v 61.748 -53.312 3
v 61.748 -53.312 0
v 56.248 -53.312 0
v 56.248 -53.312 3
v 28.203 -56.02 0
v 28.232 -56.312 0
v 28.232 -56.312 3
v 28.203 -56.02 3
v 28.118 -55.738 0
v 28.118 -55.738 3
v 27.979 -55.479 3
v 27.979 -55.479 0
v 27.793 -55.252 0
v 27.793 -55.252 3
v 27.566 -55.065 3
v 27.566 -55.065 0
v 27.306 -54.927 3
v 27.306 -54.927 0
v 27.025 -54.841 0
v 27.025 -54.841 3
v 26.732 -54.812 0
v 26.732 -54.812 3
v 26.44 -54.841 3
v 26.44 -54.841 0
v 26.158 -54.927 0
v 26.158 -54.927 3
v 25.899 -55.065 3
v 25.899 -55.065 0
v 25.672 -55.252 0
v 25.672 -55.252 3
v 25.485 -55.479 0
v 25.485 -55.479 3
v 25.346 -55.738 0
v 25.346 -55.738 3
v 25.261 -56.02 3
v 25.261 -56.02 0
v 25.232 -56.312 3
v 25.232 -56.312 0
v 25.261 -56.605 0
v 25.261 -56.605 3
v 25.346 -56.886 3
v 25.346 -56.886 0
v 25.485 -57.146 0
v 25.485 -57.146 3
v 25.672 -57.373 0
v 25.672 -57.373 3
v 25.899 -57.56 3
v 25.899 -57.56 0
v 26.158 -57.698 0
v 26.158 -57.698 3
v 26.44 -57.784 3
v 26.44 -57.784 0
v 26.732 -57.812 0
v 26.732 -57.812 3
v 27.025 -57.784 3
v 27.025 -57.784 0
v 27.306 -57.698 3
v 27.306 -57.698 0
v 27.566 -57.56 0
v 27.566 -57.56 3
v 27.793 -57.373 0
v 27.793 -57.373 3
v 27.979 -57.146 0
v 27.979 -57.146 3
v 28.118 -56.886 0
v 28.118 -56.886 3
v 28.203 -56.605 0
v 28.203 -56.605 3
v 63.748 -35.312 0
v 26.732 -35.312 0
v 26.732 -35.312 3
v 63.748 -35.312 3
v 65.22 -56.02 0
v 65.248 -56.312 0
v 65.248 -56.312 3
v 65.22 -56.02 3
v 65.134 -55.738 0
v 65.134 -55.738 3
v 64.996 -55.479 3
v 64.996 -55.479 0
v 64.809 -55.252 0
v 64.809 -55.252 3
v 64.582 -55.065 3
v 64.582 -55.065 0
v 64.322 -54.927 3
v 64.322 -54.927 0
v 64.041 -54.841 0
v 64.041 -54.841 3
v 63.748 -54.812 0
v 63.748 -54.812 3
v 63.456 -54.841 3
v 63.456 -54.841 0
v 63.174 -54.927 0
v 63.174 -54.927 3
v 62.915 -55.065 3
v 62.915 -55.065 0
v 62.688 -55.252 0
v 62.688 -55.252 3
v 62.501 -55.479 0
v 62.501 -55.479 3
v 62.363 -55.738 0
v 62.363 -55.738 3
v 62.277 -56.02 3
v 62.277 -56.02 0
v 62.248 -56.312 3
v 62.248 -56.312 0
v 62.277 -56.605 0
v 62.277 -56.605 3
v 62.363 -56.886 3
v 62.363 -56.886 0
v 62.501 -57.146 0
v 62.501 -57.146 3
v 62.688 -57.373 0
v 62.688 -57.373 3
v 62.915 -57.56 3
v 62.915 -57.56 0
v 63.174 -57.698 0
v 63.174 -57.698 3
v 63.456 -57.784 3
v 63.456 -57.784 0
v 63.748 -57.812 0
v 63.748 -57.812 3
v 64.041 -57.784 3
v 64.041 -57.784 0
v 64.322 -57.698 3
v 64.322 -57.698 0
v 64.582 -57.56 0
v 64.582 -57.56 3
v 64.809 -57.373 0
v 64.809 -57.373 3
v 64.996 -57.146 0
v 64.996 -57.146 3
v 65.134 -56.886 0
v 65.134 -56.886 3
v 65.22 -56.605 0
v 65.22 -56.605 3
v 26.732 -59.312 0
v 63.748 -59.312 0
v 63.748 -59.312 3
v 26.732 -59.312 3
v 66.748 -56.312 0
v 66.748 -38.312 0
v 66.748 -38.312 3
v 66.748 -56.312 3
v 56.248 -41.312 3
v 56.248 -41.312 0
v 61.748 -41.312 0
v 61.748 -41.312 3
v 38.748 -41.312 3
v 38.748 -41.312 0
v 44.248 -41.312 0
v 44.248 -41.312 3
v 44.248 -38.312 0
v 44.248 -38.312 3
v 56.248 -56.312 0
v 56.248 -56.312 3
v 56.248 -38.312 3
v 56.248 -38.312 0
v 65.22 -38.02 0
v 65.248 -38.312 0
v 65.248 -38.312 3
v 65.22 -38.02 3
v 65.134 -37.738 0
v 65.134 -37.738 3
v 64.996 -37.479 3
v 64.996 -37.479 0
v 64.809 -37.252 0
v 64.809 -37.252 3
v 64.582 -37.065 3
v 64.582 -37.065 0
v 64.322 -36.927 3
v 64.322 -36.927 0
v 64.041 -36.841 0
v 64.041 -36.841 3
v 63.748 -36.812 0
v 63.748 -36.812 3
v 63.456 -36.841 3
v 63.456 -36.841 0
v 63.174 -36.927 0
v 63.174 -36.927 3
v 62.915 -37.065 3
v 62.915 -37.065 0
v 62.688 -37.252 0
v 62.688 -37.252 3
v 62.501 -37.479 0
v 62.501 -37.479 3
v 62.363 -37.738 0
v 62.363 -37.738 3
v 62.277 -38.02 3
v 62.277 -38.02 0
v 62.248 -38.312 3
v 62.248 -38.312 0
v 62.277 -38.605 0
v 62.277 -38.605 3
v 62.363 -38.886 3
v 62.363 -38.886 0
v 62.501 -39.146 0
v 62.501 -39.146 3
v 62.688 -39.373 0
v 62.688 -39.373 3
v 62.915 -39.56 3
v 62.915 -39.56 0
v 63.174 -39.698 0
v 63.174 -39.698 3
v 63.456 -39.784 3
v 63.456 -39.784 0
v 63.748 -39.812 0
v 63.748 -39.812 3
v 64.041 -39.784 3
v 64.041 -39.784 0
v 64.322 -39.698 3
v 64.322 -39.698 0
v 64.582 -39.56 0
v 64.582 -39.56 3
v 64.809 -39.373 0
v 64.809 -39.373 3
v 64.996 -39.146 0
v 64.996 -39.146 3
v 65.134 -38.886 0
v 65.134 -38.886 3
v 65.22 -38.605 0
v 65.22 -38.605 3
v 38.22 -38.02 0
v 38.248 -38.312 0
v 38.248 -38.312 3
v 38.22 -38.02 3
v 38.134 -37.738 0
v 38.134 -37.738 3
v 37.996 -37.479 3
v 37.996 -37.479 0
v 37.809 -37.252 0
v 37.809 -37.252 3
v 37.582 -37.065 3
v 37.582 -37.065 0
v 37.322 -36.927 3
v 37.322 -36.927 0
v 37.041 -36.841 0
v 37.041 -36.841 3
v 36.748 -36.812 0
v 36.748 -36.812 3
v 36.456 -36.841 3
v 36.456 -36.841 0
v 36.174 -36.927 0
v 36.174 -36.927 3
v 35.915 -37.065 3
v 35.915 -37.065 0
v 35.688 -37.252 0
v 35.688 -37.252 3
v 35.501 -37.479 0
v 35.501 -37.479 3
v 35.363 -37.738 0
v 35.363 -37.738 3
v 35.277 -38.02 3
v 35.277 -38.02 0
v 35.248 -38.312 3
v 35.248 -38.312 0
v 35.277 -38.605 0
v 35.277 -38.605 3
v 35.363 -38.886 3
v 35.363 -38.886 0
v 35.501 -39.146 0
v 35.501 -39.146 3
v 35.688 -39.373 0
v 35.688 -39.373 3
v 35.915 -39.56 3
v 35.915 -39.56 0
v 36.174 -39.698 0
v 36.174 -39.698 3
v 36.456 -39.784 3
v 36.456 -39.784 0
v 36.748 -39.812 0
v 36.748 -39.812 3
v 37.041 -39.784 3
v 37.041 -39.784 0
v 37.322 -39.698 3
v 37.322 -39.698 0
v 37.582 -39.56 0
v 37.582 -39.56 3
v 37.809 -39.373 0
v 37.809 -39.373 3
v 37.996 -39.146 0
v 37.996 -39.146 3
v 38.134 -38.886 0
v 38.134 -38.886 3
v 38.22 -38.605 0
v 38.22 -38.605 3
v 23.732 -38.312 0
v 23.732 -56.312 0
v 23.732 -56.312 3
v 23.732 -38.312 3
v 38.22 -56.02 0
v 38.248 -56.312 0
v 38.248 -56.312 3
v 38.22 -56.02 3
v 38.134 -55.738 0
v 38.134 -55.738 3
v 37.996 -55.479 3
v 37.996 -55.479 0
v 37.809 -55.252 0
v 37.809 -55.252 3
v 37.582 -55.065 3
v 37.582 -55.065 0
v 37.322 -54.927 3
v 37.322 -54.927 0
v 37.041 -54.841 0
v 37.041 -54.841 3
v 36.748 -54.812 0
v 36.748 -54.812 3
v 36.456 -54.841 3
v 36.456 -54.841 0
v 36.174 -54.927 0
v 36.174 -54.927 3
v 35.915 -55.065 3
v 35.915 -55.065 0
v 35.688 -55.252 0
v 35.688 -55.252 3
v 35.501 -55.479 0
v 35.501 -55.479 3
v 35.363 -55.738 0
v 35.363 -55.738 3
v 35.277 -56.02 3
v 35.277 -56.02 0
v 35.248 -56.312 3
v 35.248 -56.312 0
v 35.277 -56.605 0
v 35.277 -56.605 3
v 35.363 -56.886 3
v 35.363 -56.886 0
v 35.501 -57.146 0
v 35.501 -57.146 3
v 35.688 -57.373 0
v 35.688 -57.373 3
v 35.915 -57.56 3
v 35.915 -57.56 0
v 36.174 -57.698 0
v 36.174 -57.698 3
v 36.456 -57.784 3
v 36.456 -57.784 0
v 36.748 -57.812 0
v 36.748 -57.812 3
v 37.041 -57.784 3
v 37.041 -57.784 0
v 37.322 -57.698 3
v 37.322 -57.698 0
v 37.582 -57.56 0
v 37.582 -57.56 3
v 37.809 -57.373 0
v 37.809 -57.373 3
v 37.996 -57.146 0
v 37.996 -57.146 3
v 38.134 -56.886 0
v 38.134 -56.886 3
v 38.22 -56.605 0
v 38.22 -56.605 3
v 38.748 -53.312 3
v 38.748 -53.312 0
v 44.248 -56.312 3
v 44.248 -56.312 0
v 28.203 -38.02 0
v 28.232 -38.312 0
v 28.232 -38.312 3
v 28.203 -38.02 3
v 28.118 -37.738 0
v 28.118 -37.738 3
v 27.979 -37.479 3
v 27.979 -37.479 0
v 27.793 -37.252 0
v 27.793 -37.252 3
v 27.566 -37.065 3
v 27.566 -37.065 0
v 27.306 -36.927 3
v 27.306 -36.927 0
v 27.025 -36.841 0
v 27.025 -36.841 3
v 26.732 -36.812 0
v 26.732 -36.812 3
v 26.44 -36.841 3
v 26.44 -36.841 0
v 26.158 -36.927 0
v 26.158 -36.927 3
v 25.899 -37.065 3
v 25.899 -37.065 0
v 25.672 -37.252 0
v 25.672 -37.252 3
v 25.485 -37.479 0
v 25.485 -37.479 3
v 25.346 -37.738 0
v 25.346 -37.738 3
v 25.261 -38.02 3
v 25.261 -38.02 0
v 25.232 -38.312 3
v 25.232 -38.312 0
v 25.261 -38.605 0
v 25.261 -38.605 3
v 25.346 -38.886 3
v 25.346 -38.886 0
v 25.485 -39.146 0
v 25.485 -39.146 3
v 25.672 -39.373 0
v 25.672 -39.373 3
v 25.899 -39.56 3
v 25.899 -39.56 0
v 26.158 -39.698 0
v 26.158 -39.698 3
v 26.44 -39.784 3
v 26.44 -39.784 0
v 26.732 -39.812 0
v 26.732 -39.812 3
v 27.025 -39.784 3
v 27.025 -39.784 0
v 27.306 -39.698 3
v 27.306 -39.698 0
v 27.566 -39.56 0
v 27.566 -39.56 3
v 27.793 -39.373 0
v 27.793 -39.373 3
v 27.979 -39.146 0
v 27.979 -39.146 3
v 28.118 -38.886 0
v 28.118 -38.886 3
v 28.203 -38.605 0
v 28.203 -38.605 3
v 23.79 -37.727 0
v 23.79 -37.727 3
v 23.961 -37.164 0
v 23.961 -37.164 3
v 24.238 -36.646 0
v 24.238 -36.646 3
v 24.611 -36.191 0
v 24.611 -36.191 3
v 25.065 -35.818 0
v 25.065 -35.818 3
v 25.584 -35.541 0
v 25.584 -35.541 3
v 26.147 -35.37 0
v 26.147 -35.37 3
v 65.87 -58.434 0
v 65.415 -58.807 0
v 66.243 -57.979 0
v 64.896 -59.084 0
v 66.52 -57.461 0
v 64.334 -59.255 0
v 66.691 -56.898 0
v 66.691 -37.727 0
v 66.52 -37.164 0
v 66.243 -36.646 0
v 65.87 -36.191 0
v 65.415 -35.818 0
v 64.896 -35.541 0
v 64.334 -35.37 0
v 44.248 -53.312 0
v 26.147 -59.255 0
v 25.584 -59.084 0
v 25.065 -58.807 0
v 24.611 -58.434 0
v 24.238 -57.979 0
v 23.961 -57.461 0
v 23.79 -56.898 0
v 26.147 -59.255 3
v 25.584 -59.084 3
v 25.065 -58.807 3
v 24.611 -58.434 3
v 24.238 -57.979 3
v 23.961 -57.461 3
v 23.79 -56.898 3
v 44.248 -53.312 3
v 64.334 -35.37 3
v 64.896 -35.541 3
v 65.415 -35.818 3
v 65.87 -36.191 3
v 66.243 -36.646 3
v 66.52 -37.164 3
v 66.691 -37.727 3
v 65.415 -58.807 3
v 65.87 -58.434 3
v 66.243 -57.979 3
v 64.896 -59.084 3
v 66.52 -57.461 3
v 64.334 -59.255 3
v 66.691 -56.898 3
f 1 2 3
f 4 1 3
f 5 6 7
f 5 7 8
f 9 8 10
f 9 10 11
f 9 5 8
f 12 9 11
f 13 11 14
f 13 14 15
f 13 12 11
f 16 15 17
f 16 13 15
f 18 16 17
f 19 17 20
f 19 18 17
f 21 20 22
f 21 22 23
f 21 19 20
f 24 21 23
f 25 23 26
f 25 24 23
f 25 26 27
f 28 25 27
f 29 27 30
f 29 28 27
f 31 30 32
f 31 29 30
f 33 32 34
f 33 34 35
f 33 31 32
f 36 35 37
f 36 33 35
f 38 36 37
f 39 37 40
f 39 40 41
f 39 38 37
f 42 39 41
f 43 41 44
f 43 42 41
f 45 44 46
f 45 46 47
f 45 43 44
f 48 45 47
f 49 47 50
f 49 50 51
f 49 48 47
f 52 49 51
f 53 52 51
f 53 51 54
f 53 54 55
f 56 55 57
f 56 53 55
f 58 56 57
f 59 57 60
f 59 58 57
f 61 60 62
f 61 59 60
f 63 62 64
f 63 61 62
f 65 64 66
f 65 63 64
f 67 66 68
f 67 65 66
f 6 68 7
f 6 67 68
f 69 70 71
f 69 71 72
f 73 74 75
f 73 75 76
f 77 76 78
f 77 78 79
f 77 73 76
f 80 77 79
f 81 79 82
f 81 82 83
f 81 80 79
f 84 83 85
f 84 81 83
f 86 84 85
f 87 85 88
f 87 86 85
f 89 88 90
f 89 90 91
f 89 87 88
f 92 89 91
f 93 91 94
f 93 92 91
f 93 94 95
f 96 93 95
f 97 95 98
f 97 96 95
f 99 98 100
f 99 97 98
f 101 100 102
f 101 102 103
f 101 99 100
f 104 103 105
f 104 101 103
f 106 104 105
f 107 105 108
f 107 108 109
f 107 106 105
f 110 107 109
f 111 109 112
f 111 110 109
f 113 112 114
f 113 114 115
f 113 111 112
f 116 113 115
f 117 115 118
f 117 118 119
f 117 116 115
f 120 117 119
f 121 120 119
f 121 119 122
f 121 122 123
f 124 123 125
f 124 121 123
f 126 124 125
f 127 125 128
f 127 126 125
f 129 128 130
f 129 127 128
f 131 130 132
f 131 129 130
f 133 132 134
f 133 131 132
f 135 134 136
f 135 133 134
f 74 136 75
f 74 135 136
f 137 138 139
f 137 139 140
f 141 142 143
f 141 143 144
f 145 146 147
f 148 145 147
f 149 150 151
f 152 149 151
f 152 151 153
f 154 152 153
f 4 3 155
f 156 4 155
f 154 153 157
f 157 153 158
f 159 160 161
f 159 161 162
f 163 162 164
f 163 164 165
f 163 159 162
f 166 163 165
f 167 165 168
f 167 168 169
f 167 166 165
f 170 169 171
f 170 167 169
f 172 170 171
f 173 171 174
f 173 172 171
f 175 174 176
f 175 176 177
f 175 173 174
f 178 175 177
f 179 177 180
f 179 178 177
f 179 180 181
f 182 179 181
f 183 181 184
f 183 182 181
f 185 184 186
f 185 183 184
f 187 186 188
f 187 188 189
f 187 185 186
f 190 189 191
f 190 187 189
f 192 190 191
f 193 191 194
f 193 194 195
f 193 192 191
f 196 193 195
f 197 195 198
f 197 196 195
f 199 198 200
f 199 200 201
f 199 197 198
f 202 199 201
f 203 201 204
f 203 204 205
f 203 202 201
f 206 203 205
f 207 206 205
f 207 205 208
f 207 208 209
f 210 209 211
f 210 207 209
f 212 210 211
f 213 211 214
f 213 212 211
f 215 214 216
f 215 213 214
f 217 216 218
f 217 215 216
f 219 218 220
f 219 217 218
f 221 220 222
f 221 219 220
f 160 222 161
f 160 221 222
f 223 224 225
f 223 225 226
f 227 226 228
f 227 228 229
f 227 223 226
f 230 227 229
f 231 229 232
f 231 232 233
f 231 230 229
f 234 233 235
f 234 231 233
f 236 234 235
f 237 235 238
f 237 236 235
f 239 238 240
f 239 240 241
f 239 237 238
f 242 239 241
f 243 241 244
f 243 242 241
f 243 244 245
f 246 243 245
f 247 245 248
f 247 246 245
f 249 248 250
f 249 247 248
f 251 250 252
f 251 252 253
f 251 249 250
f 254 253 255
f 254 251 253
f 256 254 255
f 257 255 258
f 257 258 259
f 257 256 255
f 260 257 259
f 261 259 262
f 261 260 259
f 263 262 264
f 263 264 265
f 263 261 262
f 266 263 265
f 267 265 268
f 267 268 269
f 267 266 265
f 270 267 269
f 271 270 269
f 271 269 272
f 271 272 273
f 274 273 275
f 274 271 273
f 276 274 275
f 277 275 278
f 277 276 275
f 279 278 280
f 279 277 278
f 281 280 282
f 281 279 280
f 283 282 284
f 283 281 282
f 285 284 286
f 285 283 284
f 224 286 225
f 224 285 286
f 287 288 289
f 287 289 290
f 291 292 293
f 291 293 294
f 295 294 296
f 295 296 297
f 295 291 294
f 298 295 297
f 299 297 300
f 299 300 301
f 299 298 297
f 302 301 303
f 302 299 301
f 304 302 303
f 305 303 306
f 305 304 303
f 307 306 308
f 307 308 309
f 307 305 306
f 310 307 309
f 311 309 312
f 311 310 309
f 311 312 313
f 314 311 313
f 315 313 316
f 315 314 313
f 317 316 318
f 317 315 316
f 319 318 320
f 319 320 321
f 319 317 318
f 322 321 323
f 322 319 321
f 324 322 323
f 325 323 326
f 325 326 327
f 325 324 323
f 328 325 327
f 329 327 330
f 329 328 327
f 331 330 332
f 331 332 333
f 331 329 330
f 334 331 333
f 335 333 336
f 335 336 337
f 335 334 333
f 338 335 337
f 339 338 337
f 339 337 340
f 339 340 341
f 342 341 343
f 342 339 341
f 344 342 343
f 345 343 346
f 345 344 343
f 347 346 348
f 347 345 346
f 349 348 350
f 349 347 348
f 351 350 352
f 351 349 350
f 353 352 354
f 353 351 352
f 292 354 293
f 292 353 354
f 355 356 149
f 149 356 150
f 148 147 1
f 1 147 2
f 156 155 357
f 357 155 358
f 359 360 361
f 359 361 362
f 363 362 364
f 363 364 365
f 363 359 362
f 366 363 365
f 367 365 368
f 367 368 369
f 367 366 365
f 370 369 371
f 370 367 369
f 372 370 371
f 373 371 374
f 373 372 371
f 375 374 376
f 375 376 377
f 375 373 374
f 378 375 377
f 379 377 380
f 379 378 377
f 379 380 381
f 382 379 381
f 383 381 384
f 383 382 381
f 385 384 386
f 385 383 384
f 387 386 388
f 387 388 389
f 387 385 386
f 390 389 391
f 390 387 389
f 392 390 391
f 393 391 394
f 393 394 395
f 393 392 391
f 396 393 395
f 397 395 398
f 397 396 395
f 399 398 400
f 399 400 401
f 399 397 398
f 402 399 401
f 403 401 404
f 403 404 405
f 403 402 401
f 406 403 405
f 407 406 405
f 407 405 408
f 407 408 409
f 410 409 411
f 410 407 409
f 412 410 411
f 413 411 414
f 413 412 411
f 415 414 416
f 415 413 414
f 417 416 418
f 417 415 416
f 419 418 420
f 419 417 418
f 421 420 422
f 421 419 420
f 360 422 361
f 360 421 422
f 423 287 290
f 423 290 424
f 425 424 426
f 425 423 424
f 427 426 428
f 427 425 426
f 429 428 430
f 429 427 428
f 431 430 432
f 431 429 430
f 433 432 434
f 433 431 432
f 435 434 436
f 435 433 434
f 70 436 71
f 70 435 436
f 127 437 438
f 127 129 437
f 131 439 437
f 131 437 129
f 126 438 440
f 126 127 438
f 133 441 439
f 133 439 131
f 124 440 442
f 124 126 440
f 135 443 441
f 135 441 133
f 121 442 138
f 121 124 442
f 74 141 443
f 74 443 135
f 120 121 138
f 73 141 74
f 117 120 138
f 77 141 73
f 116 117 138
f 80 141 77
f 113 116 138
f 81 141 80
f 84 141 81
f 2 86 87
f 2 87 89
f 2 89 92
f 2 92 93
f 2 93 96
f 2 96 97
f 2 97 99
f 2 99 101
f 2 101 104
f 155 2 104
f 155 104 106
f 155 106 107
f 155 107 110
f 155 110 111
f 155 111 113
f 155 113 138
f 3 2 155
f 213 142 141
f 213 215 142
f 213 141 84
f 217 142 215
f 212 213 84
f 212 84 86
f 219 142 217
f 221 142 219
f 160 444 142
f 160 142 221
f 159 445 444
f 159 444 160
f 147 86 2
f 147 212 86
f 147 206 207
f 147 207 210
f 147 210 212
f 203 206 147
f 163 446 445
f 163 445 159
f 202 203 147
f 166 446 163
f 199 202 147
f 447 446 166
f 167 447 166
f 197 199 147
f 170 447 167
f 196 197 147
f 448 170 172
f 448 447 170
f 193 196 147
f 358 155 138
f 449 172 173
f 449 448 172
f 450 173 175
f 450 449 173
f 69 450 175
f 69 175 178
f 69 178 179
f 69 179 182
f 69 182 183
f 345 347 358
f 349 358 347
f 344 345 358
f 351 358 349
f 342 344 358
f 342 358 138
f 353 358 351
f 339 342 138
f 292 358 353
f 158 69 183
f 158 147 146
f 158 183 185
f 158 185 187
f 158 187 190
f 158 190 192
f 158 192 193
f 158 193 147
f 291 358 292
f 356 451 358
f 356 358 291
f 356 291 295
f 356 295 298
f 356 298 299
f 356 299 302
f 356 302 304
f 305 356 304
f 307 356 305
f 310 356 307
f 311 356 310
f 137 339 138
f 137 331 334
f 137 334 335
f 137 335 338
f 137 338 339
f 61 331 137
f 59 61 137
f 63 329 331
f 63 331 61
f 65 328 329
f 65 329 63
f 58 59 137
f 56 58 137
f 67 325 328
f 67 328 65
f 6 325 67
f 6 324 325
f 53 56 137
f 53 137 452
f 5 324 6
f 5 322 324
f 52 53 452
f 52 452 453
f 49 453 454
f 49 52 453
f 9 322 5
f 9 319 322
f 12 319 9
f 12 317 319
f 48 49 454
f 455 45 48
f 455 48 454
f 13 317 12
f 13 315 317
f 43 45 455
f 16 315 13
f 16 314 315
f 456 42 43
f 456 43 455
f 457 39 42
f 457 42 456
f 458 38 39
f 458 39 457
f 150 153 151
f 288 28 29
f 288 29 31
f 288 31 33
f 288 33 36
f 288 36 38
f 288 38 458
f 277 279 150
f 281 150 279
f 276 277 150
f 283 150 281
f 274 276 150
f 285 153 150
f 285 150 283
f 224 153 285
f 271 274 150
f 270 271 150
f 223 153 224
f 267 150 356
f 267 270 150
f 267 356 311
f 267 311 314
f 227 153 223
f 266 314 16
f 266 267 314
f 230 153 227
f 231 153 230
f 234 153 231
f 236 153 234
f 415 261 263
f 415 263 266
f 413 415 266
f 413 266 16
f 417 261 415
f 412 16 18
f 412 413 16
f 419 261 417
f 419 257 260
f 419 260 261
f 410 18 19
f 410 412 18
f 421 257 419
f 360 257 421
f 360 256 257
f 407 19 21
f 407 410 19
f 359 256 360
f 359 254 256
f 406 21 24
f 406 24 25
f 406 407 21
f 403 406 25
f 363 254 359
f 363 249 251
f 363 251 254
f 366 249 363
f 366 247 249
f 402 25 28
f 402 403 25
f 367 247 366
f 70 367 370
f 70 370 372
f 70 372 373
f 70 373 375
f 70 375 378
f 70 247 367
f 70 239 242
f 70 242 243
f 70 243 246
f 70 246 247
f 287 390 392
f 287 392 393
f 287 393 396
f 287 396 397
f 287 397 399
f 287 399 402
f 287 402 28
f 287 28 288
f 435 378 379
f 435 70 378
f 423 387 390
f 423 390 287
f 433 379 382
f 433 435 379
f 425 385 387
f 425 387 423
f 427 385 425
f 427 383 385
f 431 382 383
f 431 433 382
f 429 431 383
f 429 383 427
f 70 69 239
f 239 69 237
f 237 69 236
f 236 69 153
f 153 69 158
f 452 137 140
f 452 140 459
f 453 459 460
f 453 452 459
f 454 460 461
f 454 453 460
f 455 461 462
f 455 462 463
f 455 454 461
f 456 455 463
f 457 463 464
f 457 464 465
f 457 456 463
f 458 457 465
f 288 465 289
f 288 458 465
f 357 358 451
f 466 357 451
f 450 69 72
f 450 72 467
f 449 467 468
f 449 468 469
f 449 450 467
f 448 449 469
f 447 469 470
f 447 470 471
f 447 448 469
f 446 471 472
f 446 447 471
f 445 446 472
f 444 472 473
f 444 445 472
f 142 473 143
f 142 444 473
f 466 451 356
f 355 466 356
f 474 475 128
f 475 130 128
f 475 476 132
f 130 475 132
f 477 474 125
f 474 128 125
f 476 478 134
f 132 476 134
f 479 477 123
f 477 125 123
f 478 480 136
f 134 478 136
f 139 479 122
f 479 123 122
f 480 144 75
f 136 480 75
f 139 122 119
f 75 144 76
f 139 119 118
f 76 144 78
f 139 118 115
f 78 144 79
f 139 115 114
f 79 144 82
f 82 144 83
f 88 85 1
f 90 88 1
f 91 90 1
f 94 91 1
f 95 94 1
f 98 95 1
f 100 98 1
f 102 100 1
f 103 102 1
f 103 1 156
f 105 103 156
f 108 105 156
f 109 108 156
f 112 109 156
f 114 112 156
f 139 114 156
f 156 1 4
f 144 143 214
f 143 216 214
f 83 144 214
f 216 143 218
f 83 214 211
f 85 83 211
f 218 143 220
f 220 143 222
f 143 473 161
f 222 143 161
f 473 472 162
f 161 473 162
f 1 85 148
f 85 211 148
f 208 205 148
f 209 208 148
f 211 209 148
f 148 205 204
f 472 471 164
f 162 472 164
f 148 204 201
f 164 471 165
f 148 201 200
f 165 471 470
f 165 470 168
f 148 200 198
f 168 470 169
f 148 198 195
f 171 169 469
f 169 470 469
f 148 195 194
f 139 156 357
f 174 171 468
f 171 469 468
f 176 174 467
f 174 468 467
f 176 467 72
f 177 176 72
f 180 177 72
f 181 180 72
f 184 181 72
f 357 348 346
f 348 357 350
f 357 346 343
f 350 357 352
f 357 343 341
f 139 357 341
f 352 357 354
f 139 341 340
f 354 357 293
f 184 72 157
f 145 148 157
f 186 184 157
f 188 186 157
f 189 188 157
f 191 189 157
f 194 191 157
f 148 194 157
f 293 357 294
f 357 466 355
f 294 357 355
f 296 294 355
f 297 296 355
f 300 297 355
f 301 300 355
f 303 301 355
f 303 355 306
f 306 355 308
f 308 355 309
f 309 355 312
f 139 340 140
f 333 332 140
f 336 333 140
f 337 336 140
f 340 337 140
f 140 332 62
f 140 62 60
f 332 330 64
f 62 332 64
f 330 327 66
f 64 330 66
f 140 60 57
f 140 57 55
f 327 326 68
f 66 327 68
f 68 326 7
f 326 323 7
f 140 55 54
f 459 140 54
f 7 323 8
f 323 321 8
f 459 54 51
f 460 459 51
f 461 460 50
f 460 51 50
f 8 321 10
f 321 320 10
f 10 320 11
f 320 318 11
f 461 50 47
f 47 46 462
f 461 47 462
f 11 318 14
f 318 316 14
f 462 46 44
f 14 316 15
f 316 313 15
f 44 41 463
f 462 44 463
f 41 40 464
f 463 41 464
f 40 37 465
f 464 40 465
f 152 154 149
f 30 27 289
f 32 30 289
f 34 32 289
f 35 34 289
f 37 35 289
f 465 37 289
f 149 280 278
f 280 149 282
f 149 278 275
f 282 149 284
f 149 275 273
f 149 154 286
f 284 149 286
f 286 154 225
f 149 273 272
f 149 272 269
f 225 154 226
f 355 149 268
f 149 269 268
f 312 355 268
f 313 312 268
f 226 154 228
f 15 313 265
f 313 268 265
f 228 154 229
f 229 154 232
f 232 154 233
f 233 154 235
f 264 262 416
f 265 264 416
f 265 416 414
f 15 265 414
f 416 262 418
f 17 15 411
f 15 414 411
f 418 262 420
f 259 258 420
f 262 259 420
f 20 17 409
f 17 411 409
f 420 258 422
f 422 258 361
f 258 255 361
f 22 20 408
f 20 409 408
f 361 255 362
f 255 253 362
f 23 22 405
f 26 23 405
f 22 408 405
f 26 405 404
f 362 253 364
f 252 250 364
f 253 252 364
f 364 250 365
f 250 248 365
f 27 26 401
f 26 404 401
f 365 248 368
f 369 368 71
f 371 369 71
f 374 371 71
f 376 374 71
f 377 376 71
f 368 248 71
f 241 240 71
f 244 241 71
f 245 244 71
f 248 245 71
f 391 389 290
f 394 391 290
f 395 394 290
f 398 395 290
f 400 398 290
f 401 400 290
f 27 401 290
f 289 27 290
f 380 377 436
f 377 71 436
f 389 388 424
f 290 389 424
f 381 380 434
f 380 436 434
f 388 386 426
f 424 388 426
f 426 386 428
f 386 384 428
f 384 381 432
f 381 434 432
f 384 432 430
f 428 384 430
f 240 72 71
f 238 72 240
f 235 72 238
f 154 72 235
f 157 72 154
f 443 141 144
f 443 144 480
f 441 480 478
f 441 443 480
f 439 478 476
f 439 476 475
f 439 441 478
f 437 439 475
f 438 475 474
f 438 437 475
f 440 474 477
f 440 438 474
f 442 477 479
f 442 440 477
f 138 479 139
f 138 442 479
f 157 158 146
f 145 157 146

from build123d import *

# Parameters (mm, degrees)
ESQUISSE17_R        = 1.5
BOSS_EXTRU_17_DEPTH = 3


with BuildPart() as part:
    # Esquisse17 → Boss.-Extru.17 (new body)
    with BuildSketch(Plane.XY):
        with BuildLine():
            Line((26.73219077, -35.312471899), (63.748376396, -35.312471899))
            ThreePointArc((63.748376396, -35.312471899), (65.869696739, -36.191151555), (66.748376396, -38.312471899))
            Line((66.748376396, -38.312471899), (66.748376396, -56.312471899))
            ThreePointArc((66.748376396, -56.312471899), (65.869696739, -58.433792242), (63.748376396, -59.312471899))
            Line((63.748376396, -59.312471899), (26.73219077, -59.312471899))
            ThreePointArc((26.73219077, -59.312471899), (24.610870426, -58.433792242), (23.73219077, -56.312471899))
            Line((23.73219077, -56.312471899), (23.73219077, -38.312471899))
            ThreePointArc((23.73219077, -38.312471899), (24.610870426, -36.191151555), (26.73219077, -35.312471899))
        make_face()
        with Locations((26.73219077, -38.312471899)):
            Circle(ESQUISSE17_R, mode=Mode.SUBTRACT)
        with Locations((63.748376396, -38.312471899)):
            Circle(ESQUISSE17_R, mode=Mode.SUBTRACT)
        with Locations((63.748376396, -56.312471899)):
            Circle(ESQUISSE17_R, mode=Mode.SUBTRACT)
        with Locations((26.73219077, -56.312471899)):
            Circle(ESQUISSE17_R, mode=Mode.SUBTRACT)
        with Locations((36.748376396, -38.312471899)):
            Circle(ESQUISSE17_R, mode=Mode.SUBTRACT)
        with Locations((36.748376396, -56.312471899)):
            Circle(ESQUISSE17_R, mode=Mode.SUBTRACT)
        Polygon((44.248376396, -41.312471899), (44.248376396, -38.312471899), (56.248376396, -38.312471899), (56.248376396, -41.312471899), (61.748376396, -41.312471899), (61.748376396, -53.312471899), (56.248376396, -53.312471899), (56.248376396, -56.312471899), (44.248376396, -56.312471899), (44.248376396, -53.312471899), (38.748376396, -53.312471899), (38.748376396, -41.312471899), align=None, mode=Mode.SUBTRACT)
    extrude(amount=BOSS_EXTRU_17_DEPTH)


solid = part.part
